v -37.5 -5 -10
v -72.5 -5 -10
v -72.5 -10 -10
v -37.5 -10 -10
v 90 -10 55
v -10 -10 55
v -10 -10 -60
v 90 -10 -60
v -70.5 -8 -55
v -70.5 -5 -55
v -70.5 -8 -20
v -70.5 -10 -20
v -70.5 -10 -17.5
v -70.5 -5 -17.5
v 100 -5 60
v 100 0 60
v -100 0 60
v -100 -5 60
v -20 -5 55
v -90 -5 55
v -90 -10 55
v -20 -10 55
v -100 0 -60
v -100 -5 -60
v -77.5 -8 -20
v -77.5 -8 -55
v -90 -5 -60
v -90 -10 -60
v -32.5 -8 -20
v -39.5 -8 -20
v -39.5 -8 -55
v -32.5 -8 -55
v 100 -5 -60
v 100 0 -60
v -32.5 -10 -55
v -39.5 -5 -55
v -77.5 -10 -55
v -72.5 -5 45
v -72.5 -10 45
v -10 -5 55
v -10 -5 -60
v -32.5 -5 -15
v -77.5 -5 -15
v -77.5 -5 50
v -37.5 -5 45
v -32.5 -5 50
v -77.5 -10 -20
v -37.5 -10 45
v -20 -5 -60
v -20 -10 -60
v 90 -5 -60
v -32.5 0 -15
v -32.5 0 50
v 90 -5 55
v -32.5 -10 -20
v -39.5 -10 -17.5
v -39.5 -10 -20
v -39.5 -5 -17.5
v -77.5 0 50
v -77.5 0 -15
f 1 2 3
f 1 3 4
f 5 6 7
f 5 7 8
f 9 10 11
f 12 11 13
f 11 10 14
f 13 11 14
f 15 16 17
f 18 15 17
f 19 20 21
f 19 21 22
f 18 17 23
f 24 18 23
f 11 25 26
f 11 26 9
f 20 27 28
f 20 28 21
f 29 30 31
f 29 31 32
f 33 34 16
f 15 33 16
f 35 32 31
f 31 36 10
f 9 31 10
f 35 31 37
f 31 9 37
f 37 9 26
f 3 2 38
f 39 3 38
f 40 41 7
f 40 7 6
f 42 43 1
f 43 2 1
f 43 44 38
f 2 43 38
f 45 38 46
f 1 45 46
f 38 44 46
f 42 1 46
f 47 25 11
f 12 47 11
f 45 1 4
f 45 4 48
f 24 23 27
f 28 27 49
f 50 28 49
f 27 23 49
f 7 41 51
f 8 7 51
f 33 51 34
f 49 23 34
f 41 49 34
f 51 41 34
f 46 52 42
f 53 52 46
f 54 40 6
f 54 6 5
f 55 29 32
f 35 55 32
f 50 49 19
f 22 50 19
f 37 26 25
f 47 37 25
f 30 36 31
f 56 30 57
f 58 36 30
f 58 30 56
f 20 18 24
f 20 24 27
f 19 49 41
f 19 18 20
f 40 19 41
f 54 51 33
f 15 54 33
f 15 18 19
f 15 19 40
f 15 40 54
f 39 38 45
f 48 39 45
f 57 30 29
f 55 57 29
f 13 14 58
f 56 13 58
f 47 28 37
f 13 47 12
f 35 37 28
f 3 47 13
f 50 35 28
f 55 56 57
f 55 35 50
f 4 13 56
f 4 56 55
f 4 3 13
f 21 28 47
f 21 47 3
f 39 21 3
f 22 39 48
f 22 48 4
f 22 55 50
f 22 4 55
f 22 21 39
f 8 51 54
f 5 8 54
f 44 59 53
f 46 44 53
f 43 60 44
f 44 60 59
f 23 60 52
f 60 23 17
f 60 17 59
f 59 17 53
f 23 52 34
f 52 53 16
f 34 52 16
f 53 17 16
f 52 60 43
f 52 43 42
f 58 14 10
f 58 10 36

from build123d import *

# Parameters (mm, degrees)
F1_DEPTH = 5
F0_W     = 70
F0_H     = 115
F0_W_2   = 45
F0_H_2   = 65
F0_W_3   = 100
F2_DEPTH = 10
F0_W_4   = 35
F0_H_3   = 55
F3_DEPTH = 10
F4_DEPTH = 5
F0_W_5   = 7
F0_H_4   = 35
F5_DEPTH = 8
F0_W_6   = 31
F6_DEPTH = 5
F0_H_5   = 2.5
F7_DEPTH = 5


with BuildPart() as f1:
    # F0 (on Front) → F1 (new body)
    with BuildSketch(Plane.XZ):
        Polygon((100, 60), (-100, 60), (-100, -60), (-90, -60), (-90, 55), (-20, 55), (-20, -60), (-10, -60), (-10, 55), (90, 55), (90, -60), (100, -60), align=None)
    extrude(amount=F1_DEPTH)

    # F0 (on Front) → F2 (join)
    with BuildSketch(Plane.XZ):
        with Locations((-55, -2.5)):
            Rectangle(F0_W, F0_H)
        Polygon((-70.5, -55), (-77.5, -55), (-77.5, -20), (-70.5, -20), (-70.5, -17.5), (-39.5, -17.5), (-39.5, -20), (-32.5, -20), (-32.5, -55), (-39.5, -55), align=None, mode=Mode.SUBTRACT)
        with Locations((-55, 17.5)):
            Rectangle(F0_W_2, F0_H_2, mode=Mode.SUBTRACT)
        with Locations((40, -2.5)):
            Rectangle(F0_W_3, F0_H)
    extrude(amount=F2_DEPTH)

    # F0 (on Front) → F3 (join)
    with BuildSketch(Plane.XZ):
        with Locations((-55, 17.5)):
            Rectangle(F0_W_2, F0_H_2)
        with Locations((-55, 17.5)):
            Rectangle(F0_W_4, F0_H_3, mode=Mode.SUBTRACT)
    extrude(amount=F3_DEPTH)

    # F0 (on Front) → F4 (cut)
    with BuildSketch(Plane.XZ):
        with Locations((-55, 17.5)):
            Rectangle(F0_W_2, F0_H_2)
        with Locations((-55, 17.5)):
            Rectangle(F0_W_4, F0_H_3, mode=Mode.SUBTRACT)
    extrude(amount=F4_DEPTH, mode=Mode.SUBTRACT)

    # F0 (on Front) → F5 (join)
    with BuildSketch(Plane.XZ):
        with Locations((-74, -37.5)):
            Rectangle(F0_W_5, F0_H_4)
        with Locations((-36, -37.5)):
            Rectangle(F0_W_5, F0_H_4)
    extrude(amount=F5_DEPTH)

    # F0 (on Front) → F6 (join)
    with BuildSketch(Plane.XZ):
        with Locations((-55, -37.5)):
            Rectangle(F0_W_6, F0_H_4)
    extrude(amount=F6_DEPTH)

    # F0 (on Front) → F7 (join)
    with BuildSketch(Plane.XZ):
        with Locations((-55, -18.75)):
            Rectangle(F0_W_6, F0_H_5)
    extrude(amount=F7_DEPTH)


solid = f1.part
